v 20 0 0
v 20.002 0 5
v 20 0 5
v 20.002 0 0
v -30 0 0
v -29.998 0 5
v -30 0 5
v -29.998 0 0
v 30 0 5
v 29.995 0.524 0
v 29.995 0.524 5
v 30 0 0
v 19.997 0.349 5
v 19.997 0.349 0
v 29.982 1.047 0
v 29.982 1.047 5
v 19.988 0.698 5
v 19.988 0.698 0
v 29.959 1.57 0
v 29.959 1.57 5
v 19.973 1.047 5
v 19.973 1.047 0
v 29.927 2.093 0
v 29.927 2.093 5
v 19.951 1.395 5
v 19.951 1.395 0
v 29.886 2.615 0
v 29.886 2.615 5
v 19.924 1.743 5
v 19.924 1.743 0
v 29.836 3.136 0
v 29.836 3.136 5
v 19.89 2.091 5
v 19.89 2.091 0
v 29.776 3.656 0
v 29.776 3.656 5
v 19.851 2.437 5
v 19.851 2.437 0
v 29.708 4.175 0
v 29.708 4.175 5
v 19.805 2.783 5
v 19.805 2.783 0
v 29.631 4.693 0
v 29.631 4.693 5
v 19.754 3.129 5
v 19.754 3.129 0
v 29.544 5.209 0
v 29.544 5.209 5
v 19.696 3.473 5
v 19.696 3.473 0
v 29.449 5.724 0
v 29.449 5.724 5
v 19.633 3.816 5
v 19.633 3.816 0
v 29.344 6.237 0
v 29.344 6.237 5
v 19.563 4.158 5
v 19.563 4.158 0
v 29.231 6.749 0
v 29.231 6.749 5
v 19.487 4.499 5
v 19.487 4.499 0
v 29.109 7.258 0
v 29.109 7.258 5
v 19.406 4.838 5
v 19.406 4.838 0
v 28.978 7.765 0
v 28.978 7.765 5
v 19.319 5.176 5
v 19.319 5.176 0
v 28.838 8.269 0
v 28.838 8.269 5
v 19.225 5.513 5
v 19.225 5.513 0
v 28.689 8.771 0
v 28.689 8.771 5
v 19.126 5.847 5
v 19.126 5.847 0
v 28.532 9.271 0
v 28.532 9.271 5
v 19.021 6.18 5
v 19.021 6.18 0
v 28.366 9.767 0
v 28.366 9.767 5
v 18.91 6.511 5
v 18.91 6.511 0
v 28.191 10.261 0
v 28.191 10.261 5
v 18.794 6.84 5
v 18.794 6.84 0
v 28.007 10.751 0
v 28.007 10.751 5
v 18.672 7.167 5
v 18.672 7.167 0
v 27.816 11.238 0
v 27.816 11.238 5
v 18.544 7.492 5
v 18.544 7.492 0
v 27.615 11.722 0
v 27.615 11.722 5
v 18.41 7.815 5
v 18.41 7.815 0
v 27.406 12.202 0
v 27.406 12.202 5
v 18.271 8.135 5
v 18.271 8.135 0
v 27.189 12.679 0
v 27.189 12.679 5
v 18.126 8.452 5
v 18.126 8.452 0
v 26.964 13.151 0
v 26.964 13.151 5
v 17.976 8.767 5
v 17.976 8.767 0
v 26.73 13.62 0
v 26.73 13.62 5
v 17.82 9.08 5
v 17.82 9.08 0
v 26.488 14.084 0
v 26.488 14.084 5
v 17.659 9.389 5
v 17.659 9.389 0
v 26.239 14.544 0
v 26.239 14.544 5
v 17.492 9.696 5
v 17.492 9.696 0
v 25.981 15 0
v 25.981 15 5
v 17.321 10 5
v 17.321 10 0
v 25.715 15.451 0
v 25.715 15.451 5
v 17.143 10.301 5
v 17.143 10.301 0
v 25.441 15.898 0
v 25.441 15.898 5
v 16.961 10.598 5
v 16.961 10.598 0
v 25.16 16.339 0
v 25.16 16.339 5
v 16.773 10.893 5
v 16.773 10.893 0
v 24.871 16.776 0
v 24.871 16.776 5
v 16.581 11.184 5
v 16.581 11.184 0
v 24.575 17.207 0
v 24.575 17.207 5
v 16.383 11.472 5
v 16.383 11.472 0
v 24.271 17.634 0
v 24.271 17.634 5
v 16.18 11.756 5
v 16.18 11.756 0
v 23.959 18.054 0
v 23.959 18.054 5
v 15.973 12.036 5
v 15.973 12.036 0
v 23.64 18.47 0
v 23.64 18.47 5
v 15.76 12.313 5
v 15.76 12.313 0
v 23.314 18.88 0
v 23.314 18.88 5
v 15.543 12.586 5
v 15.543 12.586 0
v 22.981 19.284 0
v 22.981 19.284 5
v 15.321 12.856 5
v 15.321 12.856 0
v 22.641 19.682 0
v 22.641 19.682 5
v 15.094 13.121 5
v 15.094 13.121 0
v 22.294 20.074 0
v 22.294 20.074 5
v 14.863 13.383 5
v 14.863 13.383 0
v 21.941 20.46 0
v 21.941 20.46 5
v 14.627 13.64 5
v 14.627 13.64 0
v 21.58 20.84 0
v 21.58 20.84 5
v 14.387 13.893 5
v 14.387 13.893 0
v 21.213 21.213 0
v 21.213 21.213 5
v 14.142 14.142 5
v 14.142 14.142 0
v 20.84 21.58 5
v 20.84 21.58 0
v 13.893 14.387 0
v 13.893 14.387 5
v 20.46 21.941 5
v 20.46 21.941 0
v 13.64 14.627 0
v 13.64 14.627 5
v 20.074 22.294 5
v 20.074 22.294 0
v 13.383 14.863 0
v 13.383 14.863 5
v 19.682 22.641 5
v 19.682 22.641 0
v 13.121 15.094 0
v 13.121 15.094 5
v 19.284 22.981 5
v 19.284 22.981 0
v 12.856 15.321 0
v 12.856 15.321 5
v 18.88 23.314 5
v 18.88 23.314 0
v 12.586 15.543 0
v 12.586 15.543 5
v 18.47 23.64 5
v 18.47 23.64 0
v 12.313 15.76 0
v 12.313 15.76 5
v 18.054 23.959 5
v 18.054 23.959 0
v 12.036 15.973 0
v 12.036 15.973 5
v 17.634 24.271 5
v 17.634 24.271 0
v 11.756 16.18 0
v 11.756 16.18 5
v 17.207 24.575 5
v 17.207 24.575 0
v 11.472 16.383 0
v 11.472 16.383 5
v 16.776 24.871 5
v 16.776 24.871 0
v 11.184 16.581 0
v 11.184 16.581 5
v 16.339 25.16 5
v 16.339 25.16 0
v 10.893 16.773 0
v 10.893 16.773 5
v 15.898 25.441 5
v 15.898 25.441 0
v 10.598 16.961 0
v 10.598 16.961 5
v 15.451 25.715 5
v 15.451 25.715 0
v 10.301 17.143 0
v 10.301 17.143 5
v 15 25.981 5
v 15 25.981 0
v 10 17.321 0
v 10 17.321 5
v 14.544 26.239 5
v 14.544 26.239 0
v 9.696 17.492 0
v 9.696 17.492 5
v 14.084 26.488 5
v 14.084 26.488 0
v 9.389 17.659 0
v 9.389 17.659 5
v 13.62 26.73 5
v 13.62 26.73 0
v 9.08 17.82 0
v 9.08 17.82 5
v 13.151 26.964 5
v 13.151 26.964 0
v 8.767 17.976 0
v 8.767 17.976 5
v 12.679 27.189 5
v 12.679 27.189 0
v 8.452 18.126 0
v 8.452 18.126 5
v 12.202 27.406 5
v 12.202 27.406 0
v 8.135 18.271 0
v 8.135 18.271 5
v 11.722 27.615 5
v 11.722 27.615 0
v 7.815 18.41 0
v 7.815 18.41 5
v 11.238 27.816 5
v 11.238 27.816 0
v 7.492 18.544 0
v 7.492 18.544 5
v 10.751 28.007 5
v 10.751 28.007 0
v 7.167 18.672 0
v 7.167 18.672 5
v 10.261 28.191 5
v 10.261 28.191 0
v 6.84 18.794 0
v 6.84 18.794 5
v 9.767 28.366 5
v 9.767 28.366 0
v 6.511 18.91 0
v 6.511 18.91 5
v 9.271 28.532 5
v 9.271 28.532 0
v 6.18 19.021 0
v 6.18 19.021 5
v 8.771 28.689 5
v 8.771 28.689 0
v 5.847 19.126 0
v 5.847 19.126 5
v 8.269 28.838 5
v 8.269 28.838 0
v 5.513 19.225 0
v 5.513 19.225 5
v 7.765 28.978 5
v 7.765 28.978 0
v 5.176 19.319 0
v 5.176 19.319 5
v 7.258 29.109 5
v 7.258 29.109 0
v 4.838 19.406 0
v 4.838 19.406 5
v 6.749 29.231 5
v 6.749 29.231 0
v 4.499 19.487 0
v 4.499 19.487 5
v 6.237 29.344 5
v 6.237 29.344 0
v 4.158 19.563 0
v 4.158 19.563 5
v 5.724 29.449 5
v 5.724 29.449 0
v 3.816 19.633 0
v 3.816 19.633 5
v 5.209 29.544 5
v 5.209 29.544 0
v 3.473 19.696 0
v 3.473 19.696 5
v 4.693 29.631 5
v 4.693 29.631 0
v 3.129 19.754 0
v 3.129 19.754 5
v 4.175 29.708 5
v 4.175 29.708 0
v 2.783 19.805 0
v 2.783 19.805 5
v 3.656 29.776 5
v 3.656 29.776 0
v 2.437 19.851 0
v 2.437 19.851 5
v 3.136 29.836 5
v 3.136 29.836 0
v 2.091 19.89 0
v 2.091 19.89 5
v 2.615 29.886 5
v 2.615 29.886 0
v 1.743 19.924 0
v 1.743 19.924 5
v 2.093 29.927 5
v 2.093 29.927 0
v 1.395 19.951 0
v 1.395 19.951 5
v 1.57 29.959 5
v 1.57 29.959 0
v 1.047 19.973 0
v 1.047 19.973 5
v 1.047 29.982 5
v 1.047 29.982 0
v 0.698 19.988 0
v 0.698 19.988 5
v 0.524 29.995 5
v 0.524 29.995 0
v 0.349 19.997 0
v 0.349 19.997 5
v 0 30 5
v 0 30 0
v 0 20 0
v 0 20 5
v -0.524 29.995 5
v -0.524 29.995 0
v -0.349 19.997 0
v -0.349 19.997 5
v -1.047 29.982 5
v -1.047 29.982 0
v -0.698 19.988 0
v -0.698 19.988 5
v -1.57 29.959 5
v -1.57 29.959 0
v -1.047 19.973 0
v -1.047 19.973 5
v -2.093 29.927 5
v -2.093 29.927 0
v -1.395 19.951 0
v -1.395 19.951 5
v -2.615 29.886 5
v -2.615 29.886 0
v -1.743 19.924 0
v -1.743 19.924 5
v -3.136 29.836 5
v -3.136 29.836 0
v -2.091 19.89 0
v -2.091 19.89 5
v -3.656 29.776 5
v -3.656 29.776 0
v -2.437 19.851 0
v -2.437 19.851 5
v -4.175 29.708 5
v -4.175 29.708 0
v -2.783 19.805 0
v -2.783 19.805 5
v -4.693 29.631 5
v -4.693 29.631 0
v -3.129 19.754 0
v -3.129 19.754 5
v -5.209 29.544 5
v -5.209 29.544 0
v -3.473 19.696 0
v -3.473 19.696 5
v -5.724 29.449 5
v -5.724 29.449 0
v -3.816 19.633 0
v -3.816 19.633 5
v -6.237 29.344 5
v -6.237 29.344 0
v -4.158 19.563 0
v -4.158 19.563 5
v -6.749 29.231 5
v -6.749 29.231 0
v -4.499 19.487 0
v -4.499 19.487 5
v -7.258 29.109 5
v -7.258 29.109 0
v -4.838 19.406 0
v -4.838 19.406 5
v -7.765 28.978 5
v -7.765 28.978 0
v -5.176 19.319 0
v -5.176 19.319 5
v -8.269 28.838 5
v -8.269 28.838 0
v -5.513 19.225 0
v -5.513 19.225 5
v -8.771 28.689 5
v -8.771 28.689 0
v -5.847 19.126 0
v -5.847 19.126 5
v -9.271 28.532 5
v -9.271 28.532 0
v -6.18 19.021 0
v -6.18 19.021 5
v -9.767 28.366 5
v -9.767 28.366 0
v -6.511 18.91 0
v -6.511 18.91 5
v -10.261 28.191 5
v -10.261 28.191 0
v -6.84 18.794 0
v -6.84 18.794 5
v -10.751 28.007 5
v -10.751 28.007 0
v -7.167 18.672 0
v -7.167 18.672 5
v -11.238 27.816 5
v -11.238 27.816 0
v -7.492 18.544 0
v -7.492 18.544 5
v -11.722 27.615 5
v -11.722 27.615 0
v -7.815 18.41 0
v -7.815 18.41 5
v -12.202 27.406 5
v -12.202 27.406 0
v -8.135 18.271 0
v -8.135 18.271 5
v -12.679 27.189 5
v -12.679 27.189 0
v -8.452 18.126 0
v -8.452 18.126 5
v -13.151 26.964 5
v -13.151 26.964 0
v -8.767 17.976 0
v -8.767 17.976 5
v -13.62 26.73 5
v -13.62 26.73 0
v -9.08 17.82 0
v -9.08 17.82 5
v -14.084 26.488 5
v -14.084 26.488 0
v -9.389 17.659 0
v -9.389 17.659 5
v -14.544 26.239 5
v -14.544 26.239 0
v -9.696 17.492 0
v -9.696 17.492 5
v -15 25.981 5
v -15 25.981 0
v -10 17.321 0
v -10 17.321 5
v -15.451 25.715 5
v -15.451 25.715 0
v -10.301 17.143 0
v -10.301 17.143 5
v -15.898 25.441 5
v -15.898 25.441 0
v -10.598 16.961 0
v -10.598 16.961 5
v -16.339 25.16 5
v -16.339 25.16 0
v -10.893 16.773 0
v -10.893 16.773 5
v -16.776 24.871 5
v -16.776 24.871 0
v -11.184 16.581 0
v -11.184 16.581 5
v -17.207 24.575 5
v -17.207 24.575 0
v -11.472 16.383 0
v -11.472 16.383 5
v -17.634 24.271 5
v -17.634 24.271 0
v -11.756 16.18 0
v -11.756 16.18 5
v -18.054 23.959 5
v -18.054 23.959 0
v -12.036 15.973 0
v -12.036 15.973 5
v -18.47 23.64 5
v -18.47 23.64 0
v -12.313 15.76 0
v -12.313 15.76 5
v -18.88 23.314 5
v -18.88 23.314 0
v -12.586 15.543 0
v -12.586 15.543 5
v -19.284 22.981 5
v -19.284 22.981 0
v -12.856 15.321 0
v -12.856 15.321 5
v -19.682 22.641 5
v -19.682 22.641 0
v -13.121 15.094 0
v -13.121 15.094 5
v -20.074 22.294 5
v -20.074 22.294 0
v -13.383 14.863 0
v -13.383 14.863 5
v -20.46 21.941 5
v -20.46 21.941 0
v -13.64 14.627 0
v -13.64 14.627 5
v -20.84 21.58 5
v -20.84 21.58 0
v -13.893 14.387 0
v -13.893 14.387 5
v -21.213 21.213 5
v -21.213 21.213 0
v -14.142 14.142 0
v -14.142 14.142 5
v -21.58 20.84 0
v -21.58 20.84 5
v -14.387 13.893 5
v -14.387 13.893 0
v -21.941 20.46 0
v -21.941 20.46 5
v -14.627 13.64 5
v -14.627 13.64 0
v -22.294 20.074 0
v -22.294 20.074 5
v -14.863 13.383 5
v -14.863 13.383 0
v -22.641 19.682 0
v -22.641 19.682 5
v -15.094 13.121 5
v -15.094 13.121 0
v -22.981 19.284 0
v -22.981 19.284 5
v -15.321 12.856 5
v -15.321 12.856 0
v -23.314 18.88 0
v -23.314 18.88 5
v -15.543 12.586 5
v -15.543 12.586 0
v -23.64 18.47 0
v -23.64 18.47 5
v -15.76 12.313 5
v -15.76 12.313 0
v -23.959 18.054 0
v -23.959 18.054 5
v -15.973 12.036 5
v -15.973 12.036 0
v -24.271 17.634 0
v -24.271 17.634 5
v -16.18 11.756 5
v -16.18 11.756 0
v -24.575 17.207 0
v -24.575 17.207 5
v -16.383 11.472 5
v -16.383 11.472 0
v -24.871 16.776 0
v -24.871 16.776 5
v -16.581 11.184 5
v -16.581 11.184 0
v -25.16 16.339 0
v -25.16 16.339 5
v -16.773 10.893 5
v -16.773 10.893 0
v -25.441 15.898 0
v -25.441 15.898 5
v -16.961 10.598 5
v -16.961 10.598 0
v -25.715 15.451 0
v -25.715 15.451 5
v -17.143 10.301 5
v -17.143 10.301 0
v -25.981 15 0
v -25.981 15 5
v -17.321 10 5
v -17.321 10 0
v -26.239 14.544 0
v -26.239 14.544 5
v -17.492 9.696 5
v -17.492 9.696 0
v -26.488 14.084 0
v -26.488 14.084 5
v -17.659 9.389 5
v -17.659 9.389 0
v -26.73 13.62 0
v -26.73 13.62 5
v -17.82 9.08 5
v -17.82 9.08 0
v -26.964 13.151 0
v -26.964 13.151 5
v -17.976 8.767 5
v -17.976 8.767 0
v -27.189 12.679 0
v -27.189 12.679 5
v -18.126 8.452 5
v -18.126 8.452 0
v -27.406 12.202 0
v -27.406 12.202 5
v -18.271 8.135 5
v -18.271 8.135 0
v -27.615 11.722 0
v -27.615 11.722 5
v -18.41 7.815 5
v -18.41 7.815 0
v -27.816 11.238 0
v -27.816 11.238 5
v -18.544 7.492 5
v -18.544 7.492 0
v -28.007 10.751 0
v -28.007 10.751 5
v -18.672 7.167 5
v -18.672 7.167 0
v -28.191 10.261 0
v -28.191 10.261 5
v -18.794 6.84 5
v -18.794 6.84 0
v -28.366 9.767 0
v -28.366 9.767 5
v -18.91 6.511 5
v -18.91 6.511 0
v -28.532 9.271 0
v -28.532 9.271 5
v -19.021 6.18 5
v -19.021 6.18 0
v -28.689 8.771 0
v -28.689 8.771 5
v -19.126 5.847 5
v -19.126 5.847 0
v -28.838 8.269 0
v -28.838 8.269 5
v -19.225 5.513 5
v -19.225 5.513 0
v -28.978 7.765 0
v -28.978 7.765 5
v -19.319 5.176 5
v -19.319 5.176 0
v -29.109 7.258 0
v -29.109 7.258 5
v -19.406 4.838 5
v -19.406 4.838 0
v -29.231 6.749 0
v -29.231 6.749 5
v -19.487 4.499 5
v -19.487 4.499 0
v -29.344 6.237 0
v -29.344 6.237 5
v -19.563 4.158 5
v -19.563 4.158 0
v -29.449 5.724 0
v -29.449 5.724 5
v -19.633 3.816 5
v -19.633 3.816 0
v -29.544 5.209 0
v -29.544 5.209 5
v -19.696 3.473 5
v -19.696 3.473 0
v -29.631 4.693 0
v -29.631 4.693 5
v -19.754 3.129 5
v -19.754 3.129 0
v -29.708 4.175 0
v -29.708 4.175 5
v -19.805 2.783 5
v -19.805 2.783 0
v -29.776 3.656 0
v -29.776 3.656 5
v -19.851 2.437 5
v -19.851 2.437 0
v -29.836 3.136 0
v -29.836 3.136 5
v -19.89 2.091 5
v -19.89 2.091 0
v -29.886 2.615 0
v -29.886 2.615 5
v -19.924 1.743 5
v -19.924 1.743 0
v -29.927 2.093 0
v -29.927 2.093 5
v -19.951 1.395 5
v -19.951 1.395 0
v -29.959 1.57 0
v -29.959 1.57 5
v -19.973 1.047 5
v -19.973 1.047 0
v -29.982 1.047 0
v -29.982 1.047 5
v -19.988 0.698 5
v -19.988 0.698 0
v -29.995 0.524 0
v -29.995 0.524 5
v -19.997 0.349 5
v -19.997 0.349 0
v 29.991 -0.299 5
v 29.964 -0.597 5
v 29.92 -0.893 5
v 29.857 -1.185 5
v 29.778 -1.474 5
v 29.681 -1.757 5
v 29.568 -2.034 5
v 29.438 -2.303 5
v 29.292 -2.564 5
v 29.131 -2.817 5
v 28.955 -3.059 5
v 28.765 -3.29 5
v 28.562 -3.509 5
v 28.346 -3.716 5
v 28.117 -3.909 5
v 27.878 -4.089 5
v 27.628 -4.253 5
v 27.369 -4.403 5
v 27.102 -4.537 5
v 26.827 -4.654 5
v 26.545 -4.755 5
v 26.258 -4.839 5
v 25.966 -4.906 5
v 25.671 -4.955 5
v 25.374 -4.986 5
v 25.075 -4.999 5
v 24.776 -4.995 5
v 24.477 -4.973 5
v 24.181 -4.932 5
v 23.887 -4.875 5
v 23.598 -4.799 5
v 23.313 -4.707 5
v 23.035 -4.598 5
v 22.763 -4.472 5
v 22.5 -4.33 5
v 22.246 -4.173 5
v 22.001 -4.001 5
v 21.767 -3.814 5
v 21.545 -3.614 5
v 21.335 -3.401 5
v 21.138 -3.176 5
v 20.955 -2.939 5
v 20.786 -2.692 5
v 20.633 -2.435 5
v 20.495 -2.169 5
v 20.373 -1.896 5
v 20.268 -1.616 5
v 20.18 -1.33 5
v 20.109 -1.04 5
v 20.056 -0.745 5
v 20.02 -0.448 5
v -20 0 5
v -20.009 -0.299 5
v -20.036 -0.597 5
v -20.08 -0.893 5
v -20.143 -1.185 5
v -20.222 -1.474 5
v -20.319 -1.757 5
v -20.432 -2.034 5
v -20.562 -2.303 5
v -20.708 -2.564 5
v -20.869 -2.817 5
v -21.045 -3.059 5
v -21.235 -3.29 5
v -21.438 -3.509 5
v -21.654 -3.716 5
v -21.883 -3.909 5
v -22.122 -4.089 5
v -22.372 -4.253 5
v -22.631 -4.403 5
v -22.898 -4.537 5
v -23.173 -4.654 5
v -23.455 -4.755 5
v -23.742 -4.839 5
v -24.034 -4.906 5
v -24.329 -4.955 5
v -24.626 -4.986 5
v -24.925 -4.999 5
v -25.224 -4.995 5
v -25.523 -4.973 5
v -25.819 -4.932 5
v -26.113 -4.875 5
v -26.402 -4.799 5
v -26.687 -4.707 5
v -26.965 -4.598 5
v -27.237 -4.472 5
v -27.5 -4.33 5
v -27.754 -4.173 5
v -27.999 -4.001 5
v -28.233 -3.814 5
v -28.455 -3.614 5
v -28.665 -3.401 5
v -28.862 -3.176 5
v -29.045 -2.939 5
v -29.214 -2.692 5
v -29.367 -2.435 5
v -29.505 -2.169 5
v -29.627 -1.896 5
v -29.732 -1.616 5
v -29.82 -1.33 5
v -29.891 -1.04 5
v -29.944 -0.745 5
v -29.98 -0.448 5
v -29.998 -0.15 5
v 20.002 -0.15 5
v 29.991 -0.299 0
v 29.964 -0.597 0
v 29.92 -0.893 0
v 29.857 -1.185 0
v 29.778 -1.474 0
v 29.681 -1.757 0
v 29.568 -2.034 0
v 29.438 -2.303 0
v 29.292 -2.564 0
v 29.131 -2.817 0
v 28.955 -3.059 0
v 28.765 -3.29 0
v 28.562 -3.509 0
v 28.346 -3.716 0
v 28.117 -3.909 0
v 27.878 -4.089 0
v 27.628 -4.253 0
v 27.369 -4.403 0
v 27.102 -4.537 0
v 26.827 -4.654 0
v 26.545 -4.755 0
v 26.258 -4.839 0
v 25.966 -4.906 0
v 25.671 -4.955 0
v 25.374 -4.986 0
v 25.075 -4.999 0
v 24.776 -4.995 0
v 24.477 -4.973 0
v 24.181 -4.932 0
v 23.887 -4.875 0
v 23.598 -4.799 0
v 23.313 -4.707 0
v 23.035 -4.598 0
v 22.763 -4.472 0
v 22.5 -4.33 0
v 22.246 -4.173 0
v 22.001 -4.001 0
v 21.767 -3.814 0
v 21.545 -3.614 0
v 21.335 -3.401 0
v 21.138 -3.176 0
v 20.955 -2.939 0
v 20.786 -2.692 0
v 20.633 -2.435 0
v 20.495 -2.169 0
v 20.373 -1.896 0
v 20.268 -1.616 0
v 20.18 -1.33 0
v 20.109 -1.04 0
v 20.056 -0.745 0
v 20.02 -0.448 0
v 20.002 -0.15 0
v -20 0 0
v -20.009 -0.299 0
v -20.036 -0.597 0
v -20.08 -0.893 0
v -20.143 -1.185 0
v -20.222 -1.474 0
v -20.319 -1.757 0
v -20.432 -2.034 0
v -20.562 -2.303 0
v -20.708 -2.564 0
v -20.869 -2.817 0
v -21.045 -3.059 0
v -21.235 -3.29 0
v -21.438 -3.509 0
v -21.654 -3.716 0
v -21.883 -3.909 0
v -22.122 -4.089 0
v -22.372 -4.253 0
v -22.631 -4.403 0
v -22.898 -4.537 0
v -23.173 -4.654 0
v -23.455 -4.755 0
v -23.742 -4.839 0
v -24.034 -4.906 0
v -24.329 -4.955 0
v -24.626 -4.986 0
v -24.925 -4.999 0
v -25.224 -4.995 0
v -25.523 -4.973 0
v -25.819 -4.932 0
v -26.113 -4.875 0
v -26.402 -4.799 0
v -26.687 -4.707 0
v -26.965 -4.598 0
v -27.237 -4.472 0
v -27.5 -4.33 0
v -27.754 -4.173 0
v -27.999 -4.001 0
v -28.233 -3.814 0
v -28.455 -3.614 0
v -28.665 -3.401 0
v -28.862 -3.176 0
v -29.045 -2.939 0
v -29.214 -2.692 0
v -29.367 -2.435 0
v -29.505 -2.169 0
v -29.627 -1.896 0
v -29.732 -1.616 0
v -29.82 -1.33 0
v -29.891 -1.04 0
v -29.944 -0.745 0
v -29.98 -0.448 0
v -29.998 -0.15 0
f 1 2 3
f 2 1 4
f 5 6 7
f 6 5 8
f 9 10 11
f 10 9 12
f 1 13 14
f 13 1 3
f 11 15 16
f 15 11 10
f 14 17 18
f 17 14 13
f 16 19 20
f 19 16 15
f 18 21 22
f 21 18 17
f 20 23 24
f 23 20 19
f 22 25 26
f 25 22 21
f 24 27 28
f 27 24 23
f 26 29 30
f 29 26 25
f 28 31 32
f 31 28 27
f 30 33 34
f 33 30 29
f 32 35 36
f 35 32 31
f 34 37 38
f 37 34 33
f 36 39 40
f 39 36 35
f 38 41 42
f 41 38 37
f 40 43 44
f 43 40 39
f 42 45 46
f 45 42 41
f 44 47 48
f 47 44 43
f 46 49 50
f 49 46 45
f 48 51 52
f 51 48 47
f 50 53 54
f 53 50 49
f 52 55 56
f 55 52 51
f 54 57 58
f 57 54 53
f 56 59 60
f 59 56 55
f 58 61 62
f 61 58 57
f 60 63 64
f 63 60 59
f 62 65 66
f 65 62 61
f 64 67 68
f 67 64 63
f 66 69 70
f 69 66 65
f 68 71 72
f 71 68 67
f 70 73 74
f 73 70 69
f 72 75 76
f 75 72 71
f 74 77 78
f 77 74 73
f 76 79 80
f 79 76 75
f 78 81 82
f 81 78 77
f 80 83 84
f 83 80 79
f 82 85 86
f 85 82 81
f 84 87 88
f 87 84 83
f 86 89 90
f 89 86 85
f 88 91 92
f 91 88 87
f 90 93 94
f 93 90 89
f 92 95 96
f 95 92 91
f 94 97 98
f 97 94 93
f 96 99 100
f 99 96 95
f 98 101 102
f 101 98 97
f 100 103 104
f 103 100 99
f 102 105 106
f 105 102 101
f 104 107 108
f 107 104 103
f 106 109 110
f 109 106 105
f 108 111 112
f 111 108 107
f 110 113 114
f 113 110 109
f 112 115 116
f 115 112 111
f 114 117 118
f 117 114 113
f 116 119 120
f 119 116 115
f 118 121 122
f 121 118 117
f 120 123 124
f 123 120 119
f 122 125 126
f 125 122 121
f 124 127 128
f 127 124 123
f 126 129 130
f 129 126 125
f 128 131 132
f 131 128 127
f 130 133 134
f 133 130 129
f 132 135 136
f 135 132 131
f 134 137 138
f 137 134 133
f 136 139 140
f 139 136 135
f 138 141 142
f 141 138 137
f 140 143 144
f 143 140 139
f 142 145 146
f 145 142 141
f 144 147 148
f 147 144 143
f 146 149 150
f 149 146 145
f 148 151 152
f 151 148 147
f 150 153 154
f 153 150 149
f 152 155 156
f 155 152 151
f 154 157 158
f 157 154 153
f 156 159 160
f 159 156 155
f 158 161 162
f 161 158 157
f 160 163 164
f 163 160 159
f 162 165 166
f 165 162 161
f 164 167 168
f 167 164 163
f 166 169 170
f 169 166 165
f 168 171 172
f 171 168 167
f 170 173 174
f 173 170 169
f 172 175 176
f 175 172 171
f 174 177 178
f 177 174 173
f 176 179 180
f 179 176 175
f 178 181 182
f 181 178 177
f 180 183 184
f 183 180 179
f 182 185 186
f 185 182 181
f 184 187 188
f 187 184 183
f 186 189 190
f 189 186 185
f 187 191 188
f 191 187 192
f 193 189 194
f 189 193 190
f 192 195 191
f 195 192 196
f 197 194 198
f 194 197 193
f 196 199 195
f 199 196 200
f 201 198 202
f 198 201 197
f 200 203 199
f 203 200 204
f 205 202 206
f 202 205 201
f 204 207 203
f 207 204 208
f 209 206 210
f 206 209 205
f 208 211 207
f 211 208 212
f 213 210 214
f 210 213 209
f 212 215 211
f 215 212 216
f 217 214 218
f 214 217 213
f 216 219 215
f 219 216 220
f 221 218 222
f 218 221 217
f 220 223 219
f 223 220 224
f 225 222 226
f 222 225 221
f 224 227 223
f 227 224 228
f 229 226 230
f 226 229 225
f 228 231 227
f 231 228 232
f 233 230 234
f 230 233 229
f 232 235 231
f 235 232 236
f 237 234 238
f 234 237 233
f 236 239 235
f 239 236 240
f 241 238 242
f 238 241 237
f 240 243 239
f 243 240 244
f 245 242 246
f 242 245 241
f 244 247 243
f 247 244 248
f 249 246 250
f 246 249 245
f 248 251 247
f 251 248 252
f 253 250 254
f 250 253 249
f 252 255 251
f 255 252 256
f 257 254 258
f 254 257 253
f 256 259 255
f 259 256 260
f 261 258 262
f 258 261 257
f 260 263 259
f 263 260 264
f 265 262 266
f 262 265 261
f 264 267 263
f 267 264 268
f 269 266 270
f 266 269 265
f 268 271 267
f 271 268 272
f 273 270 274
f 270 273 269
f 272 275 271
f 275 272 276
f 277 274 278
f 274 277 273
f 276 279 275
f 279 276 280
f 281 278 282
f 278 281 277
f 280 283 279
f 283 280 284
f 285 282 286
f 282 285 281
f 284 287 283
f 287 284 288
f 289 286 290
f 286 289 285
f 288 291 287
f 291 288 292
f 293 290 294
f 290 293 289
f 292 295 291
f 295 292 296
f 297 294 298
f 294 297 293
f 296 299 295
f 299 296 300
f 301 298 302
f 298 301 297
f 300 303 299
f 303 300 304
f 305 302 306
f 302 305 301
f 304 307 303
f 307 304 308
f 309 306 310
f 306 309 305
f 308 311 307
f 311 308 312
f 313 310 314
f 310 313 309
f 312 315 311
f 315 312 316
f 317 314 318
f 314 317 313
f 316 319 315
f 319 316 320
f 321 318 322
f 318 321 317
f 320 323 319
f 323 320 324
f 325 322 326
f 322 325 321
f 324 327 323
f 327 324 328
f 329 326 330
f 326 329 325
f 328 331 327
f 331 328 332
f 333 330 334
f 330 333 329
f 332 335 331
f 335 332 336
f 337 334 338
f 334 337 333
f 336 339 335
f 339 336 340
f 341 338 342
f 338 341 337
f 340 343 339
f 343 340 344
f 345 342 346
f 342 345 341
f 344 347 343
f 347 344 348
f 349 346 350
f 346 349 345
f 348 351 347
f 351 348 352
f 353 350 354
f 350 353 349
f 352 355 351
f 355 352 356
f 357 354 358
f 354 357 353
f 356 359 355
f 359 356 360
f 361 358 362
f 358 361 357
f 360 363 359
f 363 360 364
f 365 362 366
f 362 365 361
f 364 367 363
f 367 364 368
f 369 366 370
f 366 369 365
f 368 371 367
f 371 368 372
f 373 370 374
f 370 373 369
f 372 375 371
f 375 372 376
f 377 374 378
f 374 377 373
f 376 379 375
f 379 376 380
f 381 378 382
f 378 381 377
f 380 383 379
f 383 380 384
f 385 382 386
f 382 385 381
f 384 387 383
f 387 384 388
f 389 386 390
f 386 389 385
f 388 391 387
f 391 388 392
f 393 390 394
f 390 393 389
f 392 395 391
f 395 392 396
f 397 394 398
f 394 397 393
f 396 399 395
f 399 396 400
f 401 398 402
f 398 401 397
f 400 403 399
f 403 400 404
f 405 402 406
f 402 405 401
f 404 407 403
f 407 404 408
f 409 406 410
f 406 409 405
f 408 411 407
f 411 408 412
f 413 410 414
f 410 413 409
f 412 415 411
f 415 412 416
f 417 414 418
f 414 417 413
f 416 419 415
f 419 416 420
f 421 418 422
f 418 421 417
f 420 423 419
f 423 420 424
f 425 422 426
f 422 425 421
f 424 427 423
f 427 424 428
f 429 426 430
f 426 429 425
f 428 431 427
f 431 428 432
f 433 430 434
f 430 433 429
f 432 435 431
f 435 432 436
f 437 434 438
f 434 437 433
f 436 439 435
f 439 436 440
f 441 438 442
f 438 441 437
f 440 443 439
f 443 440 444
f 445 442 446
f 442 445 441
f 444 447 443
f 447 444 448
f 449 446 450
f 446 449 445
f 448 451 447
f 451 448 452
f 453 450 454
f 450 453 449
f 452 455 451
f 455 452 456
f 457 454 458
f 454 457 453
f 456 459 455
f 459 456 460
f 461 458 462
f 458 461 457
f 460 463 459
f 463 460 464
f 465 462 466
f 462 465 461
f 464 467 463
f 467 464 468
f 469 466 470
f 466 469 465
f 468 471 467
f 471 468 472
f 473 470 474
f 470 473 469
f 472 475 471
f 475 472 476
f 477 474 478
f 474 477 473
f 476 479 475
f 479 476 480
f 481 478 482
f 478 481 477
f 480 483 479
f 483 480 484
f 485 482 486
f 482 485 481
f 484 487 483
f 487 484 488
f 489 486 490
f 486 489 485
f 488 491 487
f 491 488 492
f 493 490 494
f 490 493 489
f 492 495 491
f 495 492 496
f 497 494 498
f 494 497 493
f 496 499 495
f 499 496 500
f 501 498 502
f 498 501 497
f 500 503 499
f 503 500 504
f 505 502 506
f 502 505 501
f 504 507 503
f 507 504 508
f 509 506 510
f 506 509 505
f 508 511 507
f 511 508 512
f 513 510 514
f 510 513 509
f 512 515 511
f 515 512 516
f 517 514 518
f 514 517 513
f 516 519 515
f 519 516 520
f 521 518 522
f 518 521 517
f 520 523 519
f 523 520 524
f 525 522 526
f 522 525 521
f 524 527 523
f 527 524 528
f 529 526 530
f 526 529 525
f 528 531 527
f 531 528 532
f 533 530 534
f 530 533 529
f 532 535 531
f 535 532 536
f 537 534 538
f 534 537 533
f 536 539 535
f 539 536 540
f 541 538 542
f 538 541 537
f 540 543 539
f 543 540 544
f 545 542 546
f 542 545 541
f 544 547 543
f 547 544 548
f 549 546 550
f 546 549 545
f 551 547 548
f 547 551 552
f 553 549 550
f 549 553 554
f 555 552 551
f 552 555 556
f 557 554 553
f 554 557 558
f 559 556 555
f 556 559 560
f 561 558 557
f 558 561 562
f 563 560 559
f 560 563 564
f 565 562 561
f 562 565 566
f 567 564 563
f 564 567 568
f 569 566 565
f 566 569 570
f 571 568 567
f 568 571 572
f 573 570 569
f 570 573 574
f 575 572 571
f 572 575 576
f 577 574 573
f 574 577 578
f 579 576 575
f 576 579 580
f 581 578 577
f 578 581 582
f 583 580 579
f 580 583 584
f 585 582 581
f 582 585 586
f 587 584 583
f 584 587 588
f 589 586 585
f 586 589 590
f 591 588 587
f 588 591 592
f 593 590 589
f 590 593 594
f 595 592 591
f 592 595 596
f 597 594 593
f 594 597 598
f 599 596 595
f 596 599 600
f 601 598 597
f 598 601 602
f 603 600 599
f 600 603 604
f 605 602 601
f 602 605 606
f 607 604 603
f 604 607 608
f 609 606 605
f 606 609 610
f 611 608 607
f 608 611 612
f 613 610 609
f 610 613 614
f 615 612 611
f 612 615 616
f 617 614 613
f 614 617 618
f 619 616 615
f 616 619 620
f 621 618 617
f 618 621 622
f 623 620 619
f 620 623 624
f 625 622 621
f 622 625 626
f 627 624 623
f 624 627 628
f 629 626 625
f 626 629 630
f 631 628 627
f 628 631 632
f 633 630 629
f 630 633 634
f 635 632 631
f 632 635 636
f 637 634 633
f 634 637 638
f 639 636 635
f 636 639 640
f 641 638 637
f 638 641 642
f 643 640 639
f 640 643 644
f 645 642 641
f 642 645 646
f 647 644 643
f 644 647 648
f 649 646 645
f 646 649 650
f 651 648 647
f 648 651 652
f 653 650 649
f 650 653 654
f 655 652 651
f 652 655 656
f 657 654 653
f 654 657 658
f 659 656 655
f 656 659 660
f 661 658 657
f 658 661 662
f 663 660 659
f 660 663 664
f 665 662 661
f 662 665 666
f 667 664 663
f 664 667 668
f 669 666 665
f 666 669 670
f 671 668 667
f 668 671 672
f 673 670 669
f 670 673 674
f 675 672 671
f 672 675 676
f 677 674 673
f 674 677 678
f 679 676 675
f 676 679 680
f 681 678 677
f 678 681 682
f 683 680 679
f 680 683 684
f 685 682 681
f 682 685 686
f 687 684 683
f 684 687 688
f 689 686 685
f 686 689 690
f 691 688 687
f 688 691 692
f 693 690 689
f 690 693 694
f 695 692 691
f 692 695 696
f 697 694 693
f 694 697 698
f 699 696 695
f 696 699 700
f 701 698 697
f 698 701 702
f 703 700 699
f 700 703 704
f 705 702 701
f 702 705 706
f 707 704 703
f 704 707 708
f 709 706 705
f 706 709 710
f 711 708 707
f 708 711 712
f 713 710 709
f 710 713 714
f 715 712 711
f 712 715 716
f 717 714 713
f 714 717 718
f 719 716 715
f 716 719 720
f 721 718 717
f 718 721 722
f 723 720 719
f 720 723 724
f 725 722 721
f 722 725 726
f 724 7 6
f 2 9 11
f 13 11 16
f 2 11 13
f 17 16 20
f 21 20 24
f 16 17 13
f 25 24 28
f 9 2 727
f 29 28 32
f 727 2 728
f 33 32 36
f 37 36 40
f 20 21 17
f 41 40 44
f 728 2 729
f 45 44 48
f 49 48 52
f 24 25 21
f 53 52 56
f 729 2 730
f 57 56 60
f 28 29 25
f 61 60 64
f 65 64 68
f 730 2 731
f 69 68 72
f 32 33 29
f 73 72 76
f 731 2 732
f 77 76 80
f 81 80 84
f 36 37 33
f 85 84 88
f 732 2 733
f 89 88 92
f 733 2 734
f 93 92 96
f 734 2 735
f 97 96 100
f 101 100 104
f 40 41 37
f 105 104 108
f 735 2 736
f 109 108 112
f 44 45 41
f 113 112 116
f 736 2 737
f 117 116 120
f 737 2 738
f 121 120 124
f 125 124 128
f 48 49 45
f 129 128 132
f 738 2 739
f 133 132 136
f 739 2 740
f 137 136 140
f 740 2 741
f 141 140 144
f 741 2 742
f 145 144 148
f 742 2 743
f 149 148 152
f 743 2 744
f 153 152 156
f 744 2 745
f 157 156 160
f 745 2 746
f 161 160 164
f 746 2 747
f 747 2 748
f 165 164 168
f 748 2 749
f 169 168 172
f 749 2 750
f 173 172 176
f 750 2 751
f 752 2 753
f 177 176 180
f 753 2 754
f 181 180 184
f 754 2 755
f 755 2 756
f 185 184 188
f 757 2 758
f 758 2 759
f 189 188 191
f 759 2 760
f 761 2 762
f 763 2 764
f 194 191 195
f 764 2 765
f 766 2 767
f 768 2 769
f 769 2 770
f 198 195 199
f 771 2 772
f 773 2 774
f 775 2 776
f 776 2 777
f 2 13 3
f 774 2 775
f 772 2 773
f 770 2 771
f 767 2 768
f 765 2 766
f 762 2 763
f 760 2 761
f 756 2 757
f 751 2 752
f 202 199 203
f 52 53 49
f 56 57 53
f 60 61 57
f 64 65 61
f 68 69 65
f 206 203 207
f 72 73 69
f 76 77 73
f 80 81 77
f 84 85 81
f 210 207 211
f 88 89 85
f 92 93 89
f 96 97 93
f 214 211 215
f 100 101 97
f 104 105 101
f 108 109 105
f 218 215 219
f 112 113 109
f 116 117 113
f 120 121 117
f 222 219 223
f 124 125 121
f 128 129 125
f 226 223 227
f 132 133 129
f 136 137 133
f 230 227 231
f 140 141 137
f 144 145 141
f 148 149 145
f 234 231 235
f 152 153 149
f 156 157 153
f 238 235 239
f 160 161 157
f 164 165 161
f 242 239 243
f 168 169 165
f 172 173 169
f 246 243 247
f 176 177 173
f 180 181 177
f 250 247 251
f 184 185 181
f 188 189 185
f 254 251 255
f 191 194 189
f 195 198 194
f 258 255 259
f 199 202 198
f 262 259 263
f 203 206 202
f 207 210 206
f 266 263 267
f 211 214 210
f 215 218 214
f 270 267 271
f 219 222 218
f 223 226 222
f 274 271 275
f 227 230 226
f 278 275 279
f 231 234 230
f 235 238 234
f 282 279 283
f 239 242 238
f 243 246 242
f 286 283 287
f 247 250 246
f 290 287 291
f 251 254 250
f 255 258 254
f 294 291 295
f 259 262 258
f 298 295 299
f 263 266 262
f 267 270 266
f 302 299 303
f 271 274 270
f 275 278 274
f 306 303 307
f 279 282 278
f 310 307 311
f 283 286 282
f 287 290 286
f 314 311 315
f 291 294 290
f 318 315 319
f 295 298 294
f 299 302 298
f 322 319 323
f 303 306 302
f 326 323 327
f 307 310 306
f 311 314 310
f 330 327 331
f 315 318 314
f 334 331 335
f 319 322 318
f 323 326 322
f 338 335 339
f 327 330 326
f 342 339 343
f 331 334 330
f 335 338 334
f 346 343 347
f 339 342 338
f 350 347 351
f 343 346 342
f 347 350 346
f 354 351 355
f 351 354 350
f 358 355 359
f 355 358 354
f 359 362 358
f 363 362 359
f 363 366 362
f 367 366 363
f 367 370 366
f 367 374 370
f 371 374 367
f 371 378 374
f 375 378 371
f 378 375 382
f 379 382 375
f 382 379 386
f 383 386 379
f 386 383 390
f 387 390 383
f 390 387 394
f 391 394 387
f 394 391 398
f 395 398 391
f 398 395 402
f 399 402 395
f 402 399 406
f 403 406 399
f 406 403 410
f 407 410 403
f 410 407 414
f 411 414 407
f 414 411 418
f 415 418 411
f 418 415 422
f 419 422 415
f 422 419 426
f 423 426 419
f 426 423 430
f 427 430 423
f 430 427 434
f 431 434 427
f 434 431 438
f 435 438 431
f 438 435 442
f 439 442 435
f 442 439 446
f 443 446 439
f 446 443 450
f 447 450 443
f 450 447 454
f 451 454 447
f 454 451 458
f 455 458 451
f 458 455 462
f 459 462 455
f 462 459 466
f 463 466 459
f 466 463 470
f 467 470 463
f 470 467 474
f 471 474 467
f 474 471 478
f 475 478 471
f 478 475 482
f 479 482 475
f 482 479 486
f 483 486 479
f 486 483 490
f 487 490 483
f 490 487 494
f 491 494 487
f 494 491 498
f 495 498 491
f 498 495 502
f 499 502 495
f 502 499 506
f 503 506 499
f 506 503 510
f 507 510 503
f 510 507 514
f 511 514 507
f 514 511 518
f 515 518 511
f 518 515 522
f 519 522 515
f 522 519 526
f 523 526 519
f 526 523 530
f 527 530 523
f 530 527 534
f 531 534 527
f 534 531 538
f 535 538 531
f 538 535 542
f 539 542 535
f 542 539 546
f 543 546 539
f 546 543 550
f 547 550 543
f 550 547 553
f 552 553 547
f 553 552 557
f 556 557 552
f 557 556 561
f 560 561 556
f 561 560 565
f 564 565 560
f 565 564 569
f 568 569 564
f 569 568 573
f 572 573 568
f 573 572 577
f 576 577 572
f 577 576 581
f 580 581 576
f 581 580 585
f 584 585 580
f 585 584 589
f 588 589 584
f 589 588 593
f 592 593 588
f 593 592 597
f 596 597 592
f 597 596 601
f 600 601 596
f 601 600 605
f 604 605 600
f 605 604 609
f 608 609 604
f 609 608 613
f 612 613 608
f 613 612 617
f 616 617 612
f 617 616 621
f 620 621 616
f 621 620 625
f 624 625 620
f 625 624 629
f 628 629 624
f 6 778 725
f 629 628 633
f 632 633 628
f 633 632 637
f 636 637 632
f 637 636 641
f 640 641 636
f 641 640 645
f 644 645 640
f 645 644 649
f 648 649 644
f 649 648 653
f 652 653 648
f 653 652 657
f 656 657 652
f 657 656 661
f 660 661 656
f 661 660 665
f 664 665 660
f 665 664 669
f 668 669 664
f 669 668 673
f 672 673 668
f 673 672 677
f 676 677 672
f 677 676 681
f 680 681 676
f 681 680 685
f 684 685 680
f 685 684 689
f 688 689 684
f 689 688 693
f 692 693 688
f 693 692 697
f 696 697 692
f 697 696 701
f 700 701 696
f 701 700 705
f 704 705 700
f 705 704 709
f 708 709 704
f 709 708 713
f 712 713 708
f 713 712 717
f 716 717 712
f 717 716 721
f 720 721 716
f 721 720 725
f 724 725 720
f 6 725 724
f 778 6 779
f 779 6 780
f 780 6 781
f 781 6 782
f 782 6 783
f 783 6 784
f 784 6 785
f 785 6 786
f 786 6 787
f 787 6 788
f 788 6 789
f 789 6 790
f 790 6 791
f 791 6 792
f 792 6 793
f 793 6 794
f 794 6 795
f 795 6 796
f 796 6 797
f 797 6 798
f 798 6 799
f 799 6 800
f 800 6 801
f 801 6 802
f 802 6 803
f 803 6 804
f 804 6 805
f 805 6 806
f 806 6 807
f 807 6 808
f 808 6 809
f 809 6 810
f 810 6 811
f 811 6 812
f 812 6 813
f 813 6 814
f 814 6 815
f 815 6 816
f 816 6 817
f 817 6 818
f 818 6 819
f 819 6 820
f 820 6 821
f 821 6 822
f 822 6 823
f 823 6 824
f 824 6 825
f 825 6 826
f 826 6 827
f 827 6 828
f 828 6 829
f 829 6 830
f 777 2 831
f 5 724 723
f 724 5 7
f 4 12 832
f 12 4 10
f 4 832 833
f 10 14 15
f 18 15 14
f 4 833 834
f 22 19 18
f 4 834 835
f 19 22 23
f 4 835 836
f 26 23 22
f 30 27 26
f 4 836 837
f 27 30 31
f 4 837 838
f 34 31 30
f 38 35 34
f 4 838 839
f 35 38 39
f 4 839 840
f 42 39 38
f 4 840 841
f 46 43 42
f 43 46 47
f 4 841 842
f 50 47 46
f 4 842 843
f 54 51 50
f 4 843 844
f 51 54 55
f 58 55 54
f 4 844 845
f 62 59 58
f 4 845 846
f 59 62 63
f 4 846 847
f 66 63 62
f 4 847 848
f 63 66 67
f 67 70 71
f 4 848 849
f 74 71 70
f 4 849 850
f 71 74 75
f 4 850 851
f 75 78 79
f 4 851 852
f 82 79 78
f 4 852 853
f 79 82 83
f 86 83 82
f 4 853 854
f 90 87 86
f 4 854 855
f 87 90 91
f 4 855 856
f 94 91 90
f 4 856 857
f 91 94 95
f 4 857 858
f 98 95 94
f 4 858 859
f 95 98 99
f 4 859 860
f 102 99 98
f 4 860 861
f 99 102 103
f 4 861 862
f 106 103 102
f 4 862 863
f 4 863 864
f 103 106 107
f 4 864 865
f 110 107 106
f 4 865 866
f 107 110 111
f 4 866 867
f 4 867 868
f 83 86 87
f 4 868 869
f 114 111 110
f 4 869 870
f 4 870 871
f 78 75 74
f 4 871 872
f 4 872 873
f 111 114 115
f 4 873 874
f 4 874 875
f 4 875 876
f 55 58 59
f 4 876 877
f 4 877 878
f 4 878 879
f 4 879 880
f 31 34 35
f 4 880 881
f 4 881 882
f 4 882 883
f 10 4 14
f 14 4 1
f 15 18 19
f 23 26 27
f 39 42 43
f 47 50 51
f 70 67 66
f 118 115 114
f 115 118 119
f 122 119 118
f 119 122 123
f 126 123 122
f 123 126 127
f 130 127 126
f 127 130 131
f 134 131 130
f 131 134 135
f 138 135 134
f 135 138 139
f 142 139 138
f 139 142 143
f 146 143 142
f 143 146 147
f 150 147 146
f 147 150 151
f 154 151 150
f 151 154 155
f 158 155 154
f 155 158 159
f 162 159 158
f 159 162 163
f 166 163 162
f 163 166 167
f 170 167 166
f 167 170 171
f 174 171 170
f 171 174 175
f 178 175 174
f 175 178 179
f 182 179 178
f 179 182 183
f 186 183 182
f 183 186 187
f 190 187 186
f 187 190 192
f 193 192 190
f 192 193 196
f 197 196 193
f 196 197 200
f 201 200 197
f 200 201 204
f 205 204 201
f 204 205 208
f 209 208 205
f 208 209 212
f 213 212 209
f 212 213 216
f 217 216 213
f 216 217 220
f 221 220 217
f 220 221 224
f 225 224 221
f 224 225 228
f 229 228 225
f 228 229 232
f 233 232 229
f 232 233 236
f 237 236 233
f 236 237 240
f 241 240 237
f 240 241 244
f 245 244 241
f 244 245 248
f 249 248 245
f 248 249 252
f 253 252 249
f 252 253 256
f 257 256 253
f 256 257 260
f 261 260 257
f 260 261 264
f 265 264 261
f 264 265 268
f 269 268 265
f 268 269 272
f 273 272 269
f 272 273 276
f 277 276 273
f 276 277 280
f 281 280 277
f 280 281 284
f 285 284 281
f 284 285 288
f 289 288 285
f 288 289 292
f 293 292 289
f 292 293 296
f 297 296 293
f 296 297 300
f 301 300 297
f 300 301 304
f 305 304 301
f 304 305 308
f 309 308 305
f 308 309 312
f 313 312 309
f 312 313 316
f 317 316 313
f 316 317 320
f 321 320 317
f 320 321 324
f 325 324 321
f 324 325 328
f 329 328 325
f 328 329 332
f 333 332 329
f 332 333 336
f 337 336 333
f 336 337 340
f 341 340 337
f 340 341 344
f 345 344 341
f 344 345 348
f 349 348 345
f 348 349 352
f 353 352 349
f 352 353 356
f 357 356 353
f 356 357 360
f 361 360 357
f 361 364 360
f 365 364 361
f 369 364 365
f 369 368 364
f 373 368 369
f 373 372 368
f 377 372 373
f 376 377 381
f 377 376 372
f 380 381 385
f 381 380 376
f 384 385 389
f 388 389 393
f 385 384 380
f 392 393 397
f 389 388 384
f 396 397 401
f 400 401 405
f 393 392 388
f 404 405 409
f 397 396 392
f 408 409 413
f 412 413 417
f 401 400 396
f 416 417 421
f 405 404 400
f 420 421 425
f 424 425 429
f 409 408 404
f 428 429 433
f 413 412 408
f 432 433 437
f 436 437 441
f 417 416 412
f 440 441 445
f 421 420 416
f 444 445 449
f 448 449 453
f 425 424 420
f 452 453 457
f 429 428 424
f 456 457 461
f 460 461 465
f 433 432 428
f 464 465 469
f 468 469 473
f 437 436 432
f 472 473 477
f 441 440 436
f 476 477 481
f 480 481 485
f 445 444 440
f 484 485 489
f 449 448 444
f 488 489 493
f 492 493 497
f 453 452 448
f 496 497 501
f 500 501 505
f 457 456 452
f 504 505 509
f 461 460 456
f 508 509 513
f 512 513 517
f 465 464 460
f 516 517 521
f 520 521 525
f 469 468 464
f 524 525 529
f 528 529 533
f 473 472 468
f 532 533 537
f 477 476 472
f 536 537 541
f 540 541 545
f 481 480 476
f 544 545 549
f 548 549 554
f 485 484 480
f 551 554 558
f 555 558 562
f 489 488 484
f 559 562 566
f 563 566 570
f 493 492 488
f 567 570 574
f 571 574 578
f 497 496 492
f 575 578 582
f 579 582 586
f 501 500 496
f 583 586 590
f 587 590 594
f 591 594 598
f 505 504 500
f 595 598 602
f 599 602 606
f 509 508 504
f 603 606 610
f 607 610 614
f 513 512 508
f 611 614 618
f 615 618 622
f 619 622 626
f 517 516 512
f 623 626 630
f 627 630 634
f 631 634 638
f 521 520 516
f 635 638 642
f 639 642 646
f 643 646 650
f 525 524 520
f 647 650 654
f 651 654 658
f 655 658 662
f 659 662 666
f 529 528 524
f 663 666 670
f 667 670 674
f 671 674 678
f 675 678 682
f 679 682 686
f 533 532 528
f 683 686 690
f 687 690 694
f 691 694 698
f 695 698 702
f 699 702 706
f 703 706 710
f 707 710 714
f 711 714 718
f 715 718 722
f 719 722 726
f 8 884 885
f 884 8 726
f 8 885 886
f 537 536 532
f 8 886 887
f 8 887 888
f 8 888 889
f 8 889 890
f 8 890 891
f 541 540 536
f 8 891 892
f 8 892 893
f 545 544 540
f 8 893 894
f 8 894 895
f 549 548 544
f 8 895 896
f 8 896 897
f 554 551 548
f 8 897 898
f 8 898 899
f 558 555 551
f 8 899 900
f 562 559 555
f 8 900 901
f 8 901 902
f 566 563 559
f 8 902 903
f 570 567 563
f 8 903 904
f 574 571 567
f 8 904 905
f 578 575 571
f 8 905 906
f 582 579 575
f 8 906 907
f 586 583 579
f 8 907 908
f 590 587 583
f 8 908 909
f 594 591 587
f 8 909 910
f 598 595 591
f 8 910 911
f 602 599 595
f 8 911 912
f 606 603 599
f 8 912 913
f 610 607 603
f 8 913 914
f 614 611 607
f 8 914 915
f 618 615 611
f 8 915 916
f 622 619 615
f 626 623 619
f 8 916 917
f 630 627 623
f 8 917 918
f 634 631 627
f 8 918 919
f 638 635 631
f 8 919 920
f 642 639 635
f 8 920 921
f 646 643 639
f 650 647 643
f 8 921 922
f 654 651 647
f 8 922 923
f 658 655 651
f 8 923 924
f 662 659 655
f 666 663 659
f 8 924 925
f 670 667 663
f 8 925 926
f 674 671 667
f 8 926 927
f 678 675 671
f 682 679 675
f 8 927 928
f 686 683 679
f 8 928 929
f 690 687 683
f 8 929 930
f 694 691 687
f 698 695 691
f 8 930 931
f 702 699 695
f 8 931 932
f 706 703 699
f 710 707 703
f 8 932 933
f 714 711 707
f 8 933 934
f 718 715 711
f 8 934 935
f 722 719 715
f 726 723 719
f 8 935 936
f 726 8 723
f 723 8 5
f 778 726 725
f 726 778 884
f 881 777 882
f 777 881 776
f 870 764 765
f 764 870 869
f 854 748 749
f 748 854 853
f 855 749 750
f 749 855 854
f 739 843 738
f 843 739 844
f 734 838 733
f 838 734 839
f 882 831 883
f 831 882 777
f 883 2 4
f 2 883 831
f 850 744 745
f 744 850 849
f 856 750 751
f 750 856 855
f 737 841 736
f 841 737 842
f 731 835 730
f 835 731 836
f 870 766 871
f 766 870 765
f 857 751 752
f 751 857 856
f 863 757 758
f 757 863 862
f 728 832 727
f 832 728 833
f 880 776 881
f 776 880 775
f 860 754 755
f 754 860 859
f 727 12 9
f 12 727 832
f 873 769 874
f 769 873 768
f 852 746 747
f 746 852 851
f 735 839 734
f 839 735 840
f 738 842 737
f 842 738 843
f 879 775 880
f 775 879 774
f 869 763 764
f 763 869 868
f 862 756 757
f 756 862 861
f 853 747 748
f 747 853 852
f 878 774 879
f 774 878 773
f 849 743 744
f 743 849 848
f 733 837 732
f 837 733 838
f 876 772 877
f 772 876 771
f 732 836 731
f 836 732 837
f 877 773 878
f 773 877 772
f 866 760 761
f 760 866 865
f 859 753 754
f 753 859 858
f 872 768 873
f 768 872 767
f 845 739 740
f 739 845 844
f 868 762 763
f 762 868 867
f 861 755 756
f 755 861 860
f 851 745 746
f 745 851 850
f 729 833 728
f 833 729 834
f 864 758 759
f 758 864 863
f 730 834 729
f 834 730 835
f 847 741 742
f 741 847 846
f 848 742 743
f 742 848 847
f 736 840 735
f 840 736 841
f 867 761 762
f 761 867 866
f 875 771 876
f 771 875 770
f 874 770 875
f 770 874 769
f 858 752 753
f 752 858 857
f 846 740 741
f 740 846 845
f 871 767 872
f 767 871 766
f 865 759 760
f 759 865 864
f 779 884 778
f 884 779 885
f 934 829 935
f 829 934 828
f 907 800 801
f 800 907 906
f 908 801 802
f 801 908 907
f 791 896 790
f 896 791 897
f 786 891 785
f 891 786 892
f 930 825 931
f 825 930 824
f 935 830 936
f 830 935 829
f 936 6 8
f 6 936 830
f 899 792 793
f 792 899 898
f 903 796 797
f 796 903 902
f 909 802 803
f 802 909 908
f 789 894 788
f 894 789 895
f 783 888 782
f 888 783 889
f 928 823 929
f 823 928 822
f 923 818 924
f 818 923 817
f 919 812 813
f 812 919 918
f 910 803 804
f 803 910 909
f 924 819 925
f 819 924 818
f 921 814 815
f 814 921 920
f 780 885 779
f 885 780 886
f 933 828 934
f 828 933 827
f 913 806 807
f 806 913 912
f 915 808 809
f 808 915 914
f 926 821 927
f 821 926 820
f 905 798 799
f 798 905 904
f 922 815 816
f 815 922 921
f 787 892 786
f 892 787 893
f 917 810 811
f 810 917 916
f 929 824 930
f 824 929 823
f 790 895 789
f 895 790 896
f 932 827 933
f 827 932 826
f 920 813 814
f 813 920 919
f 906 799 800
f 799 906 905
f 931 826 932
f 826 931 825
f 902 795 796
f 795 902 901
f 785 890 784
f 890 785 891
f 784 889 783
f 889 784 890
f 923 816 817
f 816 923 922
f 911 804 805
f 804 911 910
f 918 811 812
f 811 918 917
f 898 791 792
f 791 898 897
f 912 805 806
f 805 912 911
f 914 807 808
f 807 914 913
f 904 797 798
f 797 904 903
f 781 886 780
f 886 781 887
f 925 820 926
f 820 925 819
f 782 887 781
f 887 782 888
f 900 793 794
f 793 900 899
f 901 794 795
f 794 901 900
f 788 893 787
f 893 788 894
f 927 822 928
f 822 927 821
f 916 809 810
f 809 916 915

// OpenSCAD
$fs = 0.3;
$fa = 1;

rotate_extrude(angle = 180) {
	translate([20, 0, 0]) {
		square([10, 5]);
	}
}
translate([25, 0, 0])
	cylinder(r=5, h=5);
translate([-25, 0, 0])
	cylinder(r=5, h=5);
